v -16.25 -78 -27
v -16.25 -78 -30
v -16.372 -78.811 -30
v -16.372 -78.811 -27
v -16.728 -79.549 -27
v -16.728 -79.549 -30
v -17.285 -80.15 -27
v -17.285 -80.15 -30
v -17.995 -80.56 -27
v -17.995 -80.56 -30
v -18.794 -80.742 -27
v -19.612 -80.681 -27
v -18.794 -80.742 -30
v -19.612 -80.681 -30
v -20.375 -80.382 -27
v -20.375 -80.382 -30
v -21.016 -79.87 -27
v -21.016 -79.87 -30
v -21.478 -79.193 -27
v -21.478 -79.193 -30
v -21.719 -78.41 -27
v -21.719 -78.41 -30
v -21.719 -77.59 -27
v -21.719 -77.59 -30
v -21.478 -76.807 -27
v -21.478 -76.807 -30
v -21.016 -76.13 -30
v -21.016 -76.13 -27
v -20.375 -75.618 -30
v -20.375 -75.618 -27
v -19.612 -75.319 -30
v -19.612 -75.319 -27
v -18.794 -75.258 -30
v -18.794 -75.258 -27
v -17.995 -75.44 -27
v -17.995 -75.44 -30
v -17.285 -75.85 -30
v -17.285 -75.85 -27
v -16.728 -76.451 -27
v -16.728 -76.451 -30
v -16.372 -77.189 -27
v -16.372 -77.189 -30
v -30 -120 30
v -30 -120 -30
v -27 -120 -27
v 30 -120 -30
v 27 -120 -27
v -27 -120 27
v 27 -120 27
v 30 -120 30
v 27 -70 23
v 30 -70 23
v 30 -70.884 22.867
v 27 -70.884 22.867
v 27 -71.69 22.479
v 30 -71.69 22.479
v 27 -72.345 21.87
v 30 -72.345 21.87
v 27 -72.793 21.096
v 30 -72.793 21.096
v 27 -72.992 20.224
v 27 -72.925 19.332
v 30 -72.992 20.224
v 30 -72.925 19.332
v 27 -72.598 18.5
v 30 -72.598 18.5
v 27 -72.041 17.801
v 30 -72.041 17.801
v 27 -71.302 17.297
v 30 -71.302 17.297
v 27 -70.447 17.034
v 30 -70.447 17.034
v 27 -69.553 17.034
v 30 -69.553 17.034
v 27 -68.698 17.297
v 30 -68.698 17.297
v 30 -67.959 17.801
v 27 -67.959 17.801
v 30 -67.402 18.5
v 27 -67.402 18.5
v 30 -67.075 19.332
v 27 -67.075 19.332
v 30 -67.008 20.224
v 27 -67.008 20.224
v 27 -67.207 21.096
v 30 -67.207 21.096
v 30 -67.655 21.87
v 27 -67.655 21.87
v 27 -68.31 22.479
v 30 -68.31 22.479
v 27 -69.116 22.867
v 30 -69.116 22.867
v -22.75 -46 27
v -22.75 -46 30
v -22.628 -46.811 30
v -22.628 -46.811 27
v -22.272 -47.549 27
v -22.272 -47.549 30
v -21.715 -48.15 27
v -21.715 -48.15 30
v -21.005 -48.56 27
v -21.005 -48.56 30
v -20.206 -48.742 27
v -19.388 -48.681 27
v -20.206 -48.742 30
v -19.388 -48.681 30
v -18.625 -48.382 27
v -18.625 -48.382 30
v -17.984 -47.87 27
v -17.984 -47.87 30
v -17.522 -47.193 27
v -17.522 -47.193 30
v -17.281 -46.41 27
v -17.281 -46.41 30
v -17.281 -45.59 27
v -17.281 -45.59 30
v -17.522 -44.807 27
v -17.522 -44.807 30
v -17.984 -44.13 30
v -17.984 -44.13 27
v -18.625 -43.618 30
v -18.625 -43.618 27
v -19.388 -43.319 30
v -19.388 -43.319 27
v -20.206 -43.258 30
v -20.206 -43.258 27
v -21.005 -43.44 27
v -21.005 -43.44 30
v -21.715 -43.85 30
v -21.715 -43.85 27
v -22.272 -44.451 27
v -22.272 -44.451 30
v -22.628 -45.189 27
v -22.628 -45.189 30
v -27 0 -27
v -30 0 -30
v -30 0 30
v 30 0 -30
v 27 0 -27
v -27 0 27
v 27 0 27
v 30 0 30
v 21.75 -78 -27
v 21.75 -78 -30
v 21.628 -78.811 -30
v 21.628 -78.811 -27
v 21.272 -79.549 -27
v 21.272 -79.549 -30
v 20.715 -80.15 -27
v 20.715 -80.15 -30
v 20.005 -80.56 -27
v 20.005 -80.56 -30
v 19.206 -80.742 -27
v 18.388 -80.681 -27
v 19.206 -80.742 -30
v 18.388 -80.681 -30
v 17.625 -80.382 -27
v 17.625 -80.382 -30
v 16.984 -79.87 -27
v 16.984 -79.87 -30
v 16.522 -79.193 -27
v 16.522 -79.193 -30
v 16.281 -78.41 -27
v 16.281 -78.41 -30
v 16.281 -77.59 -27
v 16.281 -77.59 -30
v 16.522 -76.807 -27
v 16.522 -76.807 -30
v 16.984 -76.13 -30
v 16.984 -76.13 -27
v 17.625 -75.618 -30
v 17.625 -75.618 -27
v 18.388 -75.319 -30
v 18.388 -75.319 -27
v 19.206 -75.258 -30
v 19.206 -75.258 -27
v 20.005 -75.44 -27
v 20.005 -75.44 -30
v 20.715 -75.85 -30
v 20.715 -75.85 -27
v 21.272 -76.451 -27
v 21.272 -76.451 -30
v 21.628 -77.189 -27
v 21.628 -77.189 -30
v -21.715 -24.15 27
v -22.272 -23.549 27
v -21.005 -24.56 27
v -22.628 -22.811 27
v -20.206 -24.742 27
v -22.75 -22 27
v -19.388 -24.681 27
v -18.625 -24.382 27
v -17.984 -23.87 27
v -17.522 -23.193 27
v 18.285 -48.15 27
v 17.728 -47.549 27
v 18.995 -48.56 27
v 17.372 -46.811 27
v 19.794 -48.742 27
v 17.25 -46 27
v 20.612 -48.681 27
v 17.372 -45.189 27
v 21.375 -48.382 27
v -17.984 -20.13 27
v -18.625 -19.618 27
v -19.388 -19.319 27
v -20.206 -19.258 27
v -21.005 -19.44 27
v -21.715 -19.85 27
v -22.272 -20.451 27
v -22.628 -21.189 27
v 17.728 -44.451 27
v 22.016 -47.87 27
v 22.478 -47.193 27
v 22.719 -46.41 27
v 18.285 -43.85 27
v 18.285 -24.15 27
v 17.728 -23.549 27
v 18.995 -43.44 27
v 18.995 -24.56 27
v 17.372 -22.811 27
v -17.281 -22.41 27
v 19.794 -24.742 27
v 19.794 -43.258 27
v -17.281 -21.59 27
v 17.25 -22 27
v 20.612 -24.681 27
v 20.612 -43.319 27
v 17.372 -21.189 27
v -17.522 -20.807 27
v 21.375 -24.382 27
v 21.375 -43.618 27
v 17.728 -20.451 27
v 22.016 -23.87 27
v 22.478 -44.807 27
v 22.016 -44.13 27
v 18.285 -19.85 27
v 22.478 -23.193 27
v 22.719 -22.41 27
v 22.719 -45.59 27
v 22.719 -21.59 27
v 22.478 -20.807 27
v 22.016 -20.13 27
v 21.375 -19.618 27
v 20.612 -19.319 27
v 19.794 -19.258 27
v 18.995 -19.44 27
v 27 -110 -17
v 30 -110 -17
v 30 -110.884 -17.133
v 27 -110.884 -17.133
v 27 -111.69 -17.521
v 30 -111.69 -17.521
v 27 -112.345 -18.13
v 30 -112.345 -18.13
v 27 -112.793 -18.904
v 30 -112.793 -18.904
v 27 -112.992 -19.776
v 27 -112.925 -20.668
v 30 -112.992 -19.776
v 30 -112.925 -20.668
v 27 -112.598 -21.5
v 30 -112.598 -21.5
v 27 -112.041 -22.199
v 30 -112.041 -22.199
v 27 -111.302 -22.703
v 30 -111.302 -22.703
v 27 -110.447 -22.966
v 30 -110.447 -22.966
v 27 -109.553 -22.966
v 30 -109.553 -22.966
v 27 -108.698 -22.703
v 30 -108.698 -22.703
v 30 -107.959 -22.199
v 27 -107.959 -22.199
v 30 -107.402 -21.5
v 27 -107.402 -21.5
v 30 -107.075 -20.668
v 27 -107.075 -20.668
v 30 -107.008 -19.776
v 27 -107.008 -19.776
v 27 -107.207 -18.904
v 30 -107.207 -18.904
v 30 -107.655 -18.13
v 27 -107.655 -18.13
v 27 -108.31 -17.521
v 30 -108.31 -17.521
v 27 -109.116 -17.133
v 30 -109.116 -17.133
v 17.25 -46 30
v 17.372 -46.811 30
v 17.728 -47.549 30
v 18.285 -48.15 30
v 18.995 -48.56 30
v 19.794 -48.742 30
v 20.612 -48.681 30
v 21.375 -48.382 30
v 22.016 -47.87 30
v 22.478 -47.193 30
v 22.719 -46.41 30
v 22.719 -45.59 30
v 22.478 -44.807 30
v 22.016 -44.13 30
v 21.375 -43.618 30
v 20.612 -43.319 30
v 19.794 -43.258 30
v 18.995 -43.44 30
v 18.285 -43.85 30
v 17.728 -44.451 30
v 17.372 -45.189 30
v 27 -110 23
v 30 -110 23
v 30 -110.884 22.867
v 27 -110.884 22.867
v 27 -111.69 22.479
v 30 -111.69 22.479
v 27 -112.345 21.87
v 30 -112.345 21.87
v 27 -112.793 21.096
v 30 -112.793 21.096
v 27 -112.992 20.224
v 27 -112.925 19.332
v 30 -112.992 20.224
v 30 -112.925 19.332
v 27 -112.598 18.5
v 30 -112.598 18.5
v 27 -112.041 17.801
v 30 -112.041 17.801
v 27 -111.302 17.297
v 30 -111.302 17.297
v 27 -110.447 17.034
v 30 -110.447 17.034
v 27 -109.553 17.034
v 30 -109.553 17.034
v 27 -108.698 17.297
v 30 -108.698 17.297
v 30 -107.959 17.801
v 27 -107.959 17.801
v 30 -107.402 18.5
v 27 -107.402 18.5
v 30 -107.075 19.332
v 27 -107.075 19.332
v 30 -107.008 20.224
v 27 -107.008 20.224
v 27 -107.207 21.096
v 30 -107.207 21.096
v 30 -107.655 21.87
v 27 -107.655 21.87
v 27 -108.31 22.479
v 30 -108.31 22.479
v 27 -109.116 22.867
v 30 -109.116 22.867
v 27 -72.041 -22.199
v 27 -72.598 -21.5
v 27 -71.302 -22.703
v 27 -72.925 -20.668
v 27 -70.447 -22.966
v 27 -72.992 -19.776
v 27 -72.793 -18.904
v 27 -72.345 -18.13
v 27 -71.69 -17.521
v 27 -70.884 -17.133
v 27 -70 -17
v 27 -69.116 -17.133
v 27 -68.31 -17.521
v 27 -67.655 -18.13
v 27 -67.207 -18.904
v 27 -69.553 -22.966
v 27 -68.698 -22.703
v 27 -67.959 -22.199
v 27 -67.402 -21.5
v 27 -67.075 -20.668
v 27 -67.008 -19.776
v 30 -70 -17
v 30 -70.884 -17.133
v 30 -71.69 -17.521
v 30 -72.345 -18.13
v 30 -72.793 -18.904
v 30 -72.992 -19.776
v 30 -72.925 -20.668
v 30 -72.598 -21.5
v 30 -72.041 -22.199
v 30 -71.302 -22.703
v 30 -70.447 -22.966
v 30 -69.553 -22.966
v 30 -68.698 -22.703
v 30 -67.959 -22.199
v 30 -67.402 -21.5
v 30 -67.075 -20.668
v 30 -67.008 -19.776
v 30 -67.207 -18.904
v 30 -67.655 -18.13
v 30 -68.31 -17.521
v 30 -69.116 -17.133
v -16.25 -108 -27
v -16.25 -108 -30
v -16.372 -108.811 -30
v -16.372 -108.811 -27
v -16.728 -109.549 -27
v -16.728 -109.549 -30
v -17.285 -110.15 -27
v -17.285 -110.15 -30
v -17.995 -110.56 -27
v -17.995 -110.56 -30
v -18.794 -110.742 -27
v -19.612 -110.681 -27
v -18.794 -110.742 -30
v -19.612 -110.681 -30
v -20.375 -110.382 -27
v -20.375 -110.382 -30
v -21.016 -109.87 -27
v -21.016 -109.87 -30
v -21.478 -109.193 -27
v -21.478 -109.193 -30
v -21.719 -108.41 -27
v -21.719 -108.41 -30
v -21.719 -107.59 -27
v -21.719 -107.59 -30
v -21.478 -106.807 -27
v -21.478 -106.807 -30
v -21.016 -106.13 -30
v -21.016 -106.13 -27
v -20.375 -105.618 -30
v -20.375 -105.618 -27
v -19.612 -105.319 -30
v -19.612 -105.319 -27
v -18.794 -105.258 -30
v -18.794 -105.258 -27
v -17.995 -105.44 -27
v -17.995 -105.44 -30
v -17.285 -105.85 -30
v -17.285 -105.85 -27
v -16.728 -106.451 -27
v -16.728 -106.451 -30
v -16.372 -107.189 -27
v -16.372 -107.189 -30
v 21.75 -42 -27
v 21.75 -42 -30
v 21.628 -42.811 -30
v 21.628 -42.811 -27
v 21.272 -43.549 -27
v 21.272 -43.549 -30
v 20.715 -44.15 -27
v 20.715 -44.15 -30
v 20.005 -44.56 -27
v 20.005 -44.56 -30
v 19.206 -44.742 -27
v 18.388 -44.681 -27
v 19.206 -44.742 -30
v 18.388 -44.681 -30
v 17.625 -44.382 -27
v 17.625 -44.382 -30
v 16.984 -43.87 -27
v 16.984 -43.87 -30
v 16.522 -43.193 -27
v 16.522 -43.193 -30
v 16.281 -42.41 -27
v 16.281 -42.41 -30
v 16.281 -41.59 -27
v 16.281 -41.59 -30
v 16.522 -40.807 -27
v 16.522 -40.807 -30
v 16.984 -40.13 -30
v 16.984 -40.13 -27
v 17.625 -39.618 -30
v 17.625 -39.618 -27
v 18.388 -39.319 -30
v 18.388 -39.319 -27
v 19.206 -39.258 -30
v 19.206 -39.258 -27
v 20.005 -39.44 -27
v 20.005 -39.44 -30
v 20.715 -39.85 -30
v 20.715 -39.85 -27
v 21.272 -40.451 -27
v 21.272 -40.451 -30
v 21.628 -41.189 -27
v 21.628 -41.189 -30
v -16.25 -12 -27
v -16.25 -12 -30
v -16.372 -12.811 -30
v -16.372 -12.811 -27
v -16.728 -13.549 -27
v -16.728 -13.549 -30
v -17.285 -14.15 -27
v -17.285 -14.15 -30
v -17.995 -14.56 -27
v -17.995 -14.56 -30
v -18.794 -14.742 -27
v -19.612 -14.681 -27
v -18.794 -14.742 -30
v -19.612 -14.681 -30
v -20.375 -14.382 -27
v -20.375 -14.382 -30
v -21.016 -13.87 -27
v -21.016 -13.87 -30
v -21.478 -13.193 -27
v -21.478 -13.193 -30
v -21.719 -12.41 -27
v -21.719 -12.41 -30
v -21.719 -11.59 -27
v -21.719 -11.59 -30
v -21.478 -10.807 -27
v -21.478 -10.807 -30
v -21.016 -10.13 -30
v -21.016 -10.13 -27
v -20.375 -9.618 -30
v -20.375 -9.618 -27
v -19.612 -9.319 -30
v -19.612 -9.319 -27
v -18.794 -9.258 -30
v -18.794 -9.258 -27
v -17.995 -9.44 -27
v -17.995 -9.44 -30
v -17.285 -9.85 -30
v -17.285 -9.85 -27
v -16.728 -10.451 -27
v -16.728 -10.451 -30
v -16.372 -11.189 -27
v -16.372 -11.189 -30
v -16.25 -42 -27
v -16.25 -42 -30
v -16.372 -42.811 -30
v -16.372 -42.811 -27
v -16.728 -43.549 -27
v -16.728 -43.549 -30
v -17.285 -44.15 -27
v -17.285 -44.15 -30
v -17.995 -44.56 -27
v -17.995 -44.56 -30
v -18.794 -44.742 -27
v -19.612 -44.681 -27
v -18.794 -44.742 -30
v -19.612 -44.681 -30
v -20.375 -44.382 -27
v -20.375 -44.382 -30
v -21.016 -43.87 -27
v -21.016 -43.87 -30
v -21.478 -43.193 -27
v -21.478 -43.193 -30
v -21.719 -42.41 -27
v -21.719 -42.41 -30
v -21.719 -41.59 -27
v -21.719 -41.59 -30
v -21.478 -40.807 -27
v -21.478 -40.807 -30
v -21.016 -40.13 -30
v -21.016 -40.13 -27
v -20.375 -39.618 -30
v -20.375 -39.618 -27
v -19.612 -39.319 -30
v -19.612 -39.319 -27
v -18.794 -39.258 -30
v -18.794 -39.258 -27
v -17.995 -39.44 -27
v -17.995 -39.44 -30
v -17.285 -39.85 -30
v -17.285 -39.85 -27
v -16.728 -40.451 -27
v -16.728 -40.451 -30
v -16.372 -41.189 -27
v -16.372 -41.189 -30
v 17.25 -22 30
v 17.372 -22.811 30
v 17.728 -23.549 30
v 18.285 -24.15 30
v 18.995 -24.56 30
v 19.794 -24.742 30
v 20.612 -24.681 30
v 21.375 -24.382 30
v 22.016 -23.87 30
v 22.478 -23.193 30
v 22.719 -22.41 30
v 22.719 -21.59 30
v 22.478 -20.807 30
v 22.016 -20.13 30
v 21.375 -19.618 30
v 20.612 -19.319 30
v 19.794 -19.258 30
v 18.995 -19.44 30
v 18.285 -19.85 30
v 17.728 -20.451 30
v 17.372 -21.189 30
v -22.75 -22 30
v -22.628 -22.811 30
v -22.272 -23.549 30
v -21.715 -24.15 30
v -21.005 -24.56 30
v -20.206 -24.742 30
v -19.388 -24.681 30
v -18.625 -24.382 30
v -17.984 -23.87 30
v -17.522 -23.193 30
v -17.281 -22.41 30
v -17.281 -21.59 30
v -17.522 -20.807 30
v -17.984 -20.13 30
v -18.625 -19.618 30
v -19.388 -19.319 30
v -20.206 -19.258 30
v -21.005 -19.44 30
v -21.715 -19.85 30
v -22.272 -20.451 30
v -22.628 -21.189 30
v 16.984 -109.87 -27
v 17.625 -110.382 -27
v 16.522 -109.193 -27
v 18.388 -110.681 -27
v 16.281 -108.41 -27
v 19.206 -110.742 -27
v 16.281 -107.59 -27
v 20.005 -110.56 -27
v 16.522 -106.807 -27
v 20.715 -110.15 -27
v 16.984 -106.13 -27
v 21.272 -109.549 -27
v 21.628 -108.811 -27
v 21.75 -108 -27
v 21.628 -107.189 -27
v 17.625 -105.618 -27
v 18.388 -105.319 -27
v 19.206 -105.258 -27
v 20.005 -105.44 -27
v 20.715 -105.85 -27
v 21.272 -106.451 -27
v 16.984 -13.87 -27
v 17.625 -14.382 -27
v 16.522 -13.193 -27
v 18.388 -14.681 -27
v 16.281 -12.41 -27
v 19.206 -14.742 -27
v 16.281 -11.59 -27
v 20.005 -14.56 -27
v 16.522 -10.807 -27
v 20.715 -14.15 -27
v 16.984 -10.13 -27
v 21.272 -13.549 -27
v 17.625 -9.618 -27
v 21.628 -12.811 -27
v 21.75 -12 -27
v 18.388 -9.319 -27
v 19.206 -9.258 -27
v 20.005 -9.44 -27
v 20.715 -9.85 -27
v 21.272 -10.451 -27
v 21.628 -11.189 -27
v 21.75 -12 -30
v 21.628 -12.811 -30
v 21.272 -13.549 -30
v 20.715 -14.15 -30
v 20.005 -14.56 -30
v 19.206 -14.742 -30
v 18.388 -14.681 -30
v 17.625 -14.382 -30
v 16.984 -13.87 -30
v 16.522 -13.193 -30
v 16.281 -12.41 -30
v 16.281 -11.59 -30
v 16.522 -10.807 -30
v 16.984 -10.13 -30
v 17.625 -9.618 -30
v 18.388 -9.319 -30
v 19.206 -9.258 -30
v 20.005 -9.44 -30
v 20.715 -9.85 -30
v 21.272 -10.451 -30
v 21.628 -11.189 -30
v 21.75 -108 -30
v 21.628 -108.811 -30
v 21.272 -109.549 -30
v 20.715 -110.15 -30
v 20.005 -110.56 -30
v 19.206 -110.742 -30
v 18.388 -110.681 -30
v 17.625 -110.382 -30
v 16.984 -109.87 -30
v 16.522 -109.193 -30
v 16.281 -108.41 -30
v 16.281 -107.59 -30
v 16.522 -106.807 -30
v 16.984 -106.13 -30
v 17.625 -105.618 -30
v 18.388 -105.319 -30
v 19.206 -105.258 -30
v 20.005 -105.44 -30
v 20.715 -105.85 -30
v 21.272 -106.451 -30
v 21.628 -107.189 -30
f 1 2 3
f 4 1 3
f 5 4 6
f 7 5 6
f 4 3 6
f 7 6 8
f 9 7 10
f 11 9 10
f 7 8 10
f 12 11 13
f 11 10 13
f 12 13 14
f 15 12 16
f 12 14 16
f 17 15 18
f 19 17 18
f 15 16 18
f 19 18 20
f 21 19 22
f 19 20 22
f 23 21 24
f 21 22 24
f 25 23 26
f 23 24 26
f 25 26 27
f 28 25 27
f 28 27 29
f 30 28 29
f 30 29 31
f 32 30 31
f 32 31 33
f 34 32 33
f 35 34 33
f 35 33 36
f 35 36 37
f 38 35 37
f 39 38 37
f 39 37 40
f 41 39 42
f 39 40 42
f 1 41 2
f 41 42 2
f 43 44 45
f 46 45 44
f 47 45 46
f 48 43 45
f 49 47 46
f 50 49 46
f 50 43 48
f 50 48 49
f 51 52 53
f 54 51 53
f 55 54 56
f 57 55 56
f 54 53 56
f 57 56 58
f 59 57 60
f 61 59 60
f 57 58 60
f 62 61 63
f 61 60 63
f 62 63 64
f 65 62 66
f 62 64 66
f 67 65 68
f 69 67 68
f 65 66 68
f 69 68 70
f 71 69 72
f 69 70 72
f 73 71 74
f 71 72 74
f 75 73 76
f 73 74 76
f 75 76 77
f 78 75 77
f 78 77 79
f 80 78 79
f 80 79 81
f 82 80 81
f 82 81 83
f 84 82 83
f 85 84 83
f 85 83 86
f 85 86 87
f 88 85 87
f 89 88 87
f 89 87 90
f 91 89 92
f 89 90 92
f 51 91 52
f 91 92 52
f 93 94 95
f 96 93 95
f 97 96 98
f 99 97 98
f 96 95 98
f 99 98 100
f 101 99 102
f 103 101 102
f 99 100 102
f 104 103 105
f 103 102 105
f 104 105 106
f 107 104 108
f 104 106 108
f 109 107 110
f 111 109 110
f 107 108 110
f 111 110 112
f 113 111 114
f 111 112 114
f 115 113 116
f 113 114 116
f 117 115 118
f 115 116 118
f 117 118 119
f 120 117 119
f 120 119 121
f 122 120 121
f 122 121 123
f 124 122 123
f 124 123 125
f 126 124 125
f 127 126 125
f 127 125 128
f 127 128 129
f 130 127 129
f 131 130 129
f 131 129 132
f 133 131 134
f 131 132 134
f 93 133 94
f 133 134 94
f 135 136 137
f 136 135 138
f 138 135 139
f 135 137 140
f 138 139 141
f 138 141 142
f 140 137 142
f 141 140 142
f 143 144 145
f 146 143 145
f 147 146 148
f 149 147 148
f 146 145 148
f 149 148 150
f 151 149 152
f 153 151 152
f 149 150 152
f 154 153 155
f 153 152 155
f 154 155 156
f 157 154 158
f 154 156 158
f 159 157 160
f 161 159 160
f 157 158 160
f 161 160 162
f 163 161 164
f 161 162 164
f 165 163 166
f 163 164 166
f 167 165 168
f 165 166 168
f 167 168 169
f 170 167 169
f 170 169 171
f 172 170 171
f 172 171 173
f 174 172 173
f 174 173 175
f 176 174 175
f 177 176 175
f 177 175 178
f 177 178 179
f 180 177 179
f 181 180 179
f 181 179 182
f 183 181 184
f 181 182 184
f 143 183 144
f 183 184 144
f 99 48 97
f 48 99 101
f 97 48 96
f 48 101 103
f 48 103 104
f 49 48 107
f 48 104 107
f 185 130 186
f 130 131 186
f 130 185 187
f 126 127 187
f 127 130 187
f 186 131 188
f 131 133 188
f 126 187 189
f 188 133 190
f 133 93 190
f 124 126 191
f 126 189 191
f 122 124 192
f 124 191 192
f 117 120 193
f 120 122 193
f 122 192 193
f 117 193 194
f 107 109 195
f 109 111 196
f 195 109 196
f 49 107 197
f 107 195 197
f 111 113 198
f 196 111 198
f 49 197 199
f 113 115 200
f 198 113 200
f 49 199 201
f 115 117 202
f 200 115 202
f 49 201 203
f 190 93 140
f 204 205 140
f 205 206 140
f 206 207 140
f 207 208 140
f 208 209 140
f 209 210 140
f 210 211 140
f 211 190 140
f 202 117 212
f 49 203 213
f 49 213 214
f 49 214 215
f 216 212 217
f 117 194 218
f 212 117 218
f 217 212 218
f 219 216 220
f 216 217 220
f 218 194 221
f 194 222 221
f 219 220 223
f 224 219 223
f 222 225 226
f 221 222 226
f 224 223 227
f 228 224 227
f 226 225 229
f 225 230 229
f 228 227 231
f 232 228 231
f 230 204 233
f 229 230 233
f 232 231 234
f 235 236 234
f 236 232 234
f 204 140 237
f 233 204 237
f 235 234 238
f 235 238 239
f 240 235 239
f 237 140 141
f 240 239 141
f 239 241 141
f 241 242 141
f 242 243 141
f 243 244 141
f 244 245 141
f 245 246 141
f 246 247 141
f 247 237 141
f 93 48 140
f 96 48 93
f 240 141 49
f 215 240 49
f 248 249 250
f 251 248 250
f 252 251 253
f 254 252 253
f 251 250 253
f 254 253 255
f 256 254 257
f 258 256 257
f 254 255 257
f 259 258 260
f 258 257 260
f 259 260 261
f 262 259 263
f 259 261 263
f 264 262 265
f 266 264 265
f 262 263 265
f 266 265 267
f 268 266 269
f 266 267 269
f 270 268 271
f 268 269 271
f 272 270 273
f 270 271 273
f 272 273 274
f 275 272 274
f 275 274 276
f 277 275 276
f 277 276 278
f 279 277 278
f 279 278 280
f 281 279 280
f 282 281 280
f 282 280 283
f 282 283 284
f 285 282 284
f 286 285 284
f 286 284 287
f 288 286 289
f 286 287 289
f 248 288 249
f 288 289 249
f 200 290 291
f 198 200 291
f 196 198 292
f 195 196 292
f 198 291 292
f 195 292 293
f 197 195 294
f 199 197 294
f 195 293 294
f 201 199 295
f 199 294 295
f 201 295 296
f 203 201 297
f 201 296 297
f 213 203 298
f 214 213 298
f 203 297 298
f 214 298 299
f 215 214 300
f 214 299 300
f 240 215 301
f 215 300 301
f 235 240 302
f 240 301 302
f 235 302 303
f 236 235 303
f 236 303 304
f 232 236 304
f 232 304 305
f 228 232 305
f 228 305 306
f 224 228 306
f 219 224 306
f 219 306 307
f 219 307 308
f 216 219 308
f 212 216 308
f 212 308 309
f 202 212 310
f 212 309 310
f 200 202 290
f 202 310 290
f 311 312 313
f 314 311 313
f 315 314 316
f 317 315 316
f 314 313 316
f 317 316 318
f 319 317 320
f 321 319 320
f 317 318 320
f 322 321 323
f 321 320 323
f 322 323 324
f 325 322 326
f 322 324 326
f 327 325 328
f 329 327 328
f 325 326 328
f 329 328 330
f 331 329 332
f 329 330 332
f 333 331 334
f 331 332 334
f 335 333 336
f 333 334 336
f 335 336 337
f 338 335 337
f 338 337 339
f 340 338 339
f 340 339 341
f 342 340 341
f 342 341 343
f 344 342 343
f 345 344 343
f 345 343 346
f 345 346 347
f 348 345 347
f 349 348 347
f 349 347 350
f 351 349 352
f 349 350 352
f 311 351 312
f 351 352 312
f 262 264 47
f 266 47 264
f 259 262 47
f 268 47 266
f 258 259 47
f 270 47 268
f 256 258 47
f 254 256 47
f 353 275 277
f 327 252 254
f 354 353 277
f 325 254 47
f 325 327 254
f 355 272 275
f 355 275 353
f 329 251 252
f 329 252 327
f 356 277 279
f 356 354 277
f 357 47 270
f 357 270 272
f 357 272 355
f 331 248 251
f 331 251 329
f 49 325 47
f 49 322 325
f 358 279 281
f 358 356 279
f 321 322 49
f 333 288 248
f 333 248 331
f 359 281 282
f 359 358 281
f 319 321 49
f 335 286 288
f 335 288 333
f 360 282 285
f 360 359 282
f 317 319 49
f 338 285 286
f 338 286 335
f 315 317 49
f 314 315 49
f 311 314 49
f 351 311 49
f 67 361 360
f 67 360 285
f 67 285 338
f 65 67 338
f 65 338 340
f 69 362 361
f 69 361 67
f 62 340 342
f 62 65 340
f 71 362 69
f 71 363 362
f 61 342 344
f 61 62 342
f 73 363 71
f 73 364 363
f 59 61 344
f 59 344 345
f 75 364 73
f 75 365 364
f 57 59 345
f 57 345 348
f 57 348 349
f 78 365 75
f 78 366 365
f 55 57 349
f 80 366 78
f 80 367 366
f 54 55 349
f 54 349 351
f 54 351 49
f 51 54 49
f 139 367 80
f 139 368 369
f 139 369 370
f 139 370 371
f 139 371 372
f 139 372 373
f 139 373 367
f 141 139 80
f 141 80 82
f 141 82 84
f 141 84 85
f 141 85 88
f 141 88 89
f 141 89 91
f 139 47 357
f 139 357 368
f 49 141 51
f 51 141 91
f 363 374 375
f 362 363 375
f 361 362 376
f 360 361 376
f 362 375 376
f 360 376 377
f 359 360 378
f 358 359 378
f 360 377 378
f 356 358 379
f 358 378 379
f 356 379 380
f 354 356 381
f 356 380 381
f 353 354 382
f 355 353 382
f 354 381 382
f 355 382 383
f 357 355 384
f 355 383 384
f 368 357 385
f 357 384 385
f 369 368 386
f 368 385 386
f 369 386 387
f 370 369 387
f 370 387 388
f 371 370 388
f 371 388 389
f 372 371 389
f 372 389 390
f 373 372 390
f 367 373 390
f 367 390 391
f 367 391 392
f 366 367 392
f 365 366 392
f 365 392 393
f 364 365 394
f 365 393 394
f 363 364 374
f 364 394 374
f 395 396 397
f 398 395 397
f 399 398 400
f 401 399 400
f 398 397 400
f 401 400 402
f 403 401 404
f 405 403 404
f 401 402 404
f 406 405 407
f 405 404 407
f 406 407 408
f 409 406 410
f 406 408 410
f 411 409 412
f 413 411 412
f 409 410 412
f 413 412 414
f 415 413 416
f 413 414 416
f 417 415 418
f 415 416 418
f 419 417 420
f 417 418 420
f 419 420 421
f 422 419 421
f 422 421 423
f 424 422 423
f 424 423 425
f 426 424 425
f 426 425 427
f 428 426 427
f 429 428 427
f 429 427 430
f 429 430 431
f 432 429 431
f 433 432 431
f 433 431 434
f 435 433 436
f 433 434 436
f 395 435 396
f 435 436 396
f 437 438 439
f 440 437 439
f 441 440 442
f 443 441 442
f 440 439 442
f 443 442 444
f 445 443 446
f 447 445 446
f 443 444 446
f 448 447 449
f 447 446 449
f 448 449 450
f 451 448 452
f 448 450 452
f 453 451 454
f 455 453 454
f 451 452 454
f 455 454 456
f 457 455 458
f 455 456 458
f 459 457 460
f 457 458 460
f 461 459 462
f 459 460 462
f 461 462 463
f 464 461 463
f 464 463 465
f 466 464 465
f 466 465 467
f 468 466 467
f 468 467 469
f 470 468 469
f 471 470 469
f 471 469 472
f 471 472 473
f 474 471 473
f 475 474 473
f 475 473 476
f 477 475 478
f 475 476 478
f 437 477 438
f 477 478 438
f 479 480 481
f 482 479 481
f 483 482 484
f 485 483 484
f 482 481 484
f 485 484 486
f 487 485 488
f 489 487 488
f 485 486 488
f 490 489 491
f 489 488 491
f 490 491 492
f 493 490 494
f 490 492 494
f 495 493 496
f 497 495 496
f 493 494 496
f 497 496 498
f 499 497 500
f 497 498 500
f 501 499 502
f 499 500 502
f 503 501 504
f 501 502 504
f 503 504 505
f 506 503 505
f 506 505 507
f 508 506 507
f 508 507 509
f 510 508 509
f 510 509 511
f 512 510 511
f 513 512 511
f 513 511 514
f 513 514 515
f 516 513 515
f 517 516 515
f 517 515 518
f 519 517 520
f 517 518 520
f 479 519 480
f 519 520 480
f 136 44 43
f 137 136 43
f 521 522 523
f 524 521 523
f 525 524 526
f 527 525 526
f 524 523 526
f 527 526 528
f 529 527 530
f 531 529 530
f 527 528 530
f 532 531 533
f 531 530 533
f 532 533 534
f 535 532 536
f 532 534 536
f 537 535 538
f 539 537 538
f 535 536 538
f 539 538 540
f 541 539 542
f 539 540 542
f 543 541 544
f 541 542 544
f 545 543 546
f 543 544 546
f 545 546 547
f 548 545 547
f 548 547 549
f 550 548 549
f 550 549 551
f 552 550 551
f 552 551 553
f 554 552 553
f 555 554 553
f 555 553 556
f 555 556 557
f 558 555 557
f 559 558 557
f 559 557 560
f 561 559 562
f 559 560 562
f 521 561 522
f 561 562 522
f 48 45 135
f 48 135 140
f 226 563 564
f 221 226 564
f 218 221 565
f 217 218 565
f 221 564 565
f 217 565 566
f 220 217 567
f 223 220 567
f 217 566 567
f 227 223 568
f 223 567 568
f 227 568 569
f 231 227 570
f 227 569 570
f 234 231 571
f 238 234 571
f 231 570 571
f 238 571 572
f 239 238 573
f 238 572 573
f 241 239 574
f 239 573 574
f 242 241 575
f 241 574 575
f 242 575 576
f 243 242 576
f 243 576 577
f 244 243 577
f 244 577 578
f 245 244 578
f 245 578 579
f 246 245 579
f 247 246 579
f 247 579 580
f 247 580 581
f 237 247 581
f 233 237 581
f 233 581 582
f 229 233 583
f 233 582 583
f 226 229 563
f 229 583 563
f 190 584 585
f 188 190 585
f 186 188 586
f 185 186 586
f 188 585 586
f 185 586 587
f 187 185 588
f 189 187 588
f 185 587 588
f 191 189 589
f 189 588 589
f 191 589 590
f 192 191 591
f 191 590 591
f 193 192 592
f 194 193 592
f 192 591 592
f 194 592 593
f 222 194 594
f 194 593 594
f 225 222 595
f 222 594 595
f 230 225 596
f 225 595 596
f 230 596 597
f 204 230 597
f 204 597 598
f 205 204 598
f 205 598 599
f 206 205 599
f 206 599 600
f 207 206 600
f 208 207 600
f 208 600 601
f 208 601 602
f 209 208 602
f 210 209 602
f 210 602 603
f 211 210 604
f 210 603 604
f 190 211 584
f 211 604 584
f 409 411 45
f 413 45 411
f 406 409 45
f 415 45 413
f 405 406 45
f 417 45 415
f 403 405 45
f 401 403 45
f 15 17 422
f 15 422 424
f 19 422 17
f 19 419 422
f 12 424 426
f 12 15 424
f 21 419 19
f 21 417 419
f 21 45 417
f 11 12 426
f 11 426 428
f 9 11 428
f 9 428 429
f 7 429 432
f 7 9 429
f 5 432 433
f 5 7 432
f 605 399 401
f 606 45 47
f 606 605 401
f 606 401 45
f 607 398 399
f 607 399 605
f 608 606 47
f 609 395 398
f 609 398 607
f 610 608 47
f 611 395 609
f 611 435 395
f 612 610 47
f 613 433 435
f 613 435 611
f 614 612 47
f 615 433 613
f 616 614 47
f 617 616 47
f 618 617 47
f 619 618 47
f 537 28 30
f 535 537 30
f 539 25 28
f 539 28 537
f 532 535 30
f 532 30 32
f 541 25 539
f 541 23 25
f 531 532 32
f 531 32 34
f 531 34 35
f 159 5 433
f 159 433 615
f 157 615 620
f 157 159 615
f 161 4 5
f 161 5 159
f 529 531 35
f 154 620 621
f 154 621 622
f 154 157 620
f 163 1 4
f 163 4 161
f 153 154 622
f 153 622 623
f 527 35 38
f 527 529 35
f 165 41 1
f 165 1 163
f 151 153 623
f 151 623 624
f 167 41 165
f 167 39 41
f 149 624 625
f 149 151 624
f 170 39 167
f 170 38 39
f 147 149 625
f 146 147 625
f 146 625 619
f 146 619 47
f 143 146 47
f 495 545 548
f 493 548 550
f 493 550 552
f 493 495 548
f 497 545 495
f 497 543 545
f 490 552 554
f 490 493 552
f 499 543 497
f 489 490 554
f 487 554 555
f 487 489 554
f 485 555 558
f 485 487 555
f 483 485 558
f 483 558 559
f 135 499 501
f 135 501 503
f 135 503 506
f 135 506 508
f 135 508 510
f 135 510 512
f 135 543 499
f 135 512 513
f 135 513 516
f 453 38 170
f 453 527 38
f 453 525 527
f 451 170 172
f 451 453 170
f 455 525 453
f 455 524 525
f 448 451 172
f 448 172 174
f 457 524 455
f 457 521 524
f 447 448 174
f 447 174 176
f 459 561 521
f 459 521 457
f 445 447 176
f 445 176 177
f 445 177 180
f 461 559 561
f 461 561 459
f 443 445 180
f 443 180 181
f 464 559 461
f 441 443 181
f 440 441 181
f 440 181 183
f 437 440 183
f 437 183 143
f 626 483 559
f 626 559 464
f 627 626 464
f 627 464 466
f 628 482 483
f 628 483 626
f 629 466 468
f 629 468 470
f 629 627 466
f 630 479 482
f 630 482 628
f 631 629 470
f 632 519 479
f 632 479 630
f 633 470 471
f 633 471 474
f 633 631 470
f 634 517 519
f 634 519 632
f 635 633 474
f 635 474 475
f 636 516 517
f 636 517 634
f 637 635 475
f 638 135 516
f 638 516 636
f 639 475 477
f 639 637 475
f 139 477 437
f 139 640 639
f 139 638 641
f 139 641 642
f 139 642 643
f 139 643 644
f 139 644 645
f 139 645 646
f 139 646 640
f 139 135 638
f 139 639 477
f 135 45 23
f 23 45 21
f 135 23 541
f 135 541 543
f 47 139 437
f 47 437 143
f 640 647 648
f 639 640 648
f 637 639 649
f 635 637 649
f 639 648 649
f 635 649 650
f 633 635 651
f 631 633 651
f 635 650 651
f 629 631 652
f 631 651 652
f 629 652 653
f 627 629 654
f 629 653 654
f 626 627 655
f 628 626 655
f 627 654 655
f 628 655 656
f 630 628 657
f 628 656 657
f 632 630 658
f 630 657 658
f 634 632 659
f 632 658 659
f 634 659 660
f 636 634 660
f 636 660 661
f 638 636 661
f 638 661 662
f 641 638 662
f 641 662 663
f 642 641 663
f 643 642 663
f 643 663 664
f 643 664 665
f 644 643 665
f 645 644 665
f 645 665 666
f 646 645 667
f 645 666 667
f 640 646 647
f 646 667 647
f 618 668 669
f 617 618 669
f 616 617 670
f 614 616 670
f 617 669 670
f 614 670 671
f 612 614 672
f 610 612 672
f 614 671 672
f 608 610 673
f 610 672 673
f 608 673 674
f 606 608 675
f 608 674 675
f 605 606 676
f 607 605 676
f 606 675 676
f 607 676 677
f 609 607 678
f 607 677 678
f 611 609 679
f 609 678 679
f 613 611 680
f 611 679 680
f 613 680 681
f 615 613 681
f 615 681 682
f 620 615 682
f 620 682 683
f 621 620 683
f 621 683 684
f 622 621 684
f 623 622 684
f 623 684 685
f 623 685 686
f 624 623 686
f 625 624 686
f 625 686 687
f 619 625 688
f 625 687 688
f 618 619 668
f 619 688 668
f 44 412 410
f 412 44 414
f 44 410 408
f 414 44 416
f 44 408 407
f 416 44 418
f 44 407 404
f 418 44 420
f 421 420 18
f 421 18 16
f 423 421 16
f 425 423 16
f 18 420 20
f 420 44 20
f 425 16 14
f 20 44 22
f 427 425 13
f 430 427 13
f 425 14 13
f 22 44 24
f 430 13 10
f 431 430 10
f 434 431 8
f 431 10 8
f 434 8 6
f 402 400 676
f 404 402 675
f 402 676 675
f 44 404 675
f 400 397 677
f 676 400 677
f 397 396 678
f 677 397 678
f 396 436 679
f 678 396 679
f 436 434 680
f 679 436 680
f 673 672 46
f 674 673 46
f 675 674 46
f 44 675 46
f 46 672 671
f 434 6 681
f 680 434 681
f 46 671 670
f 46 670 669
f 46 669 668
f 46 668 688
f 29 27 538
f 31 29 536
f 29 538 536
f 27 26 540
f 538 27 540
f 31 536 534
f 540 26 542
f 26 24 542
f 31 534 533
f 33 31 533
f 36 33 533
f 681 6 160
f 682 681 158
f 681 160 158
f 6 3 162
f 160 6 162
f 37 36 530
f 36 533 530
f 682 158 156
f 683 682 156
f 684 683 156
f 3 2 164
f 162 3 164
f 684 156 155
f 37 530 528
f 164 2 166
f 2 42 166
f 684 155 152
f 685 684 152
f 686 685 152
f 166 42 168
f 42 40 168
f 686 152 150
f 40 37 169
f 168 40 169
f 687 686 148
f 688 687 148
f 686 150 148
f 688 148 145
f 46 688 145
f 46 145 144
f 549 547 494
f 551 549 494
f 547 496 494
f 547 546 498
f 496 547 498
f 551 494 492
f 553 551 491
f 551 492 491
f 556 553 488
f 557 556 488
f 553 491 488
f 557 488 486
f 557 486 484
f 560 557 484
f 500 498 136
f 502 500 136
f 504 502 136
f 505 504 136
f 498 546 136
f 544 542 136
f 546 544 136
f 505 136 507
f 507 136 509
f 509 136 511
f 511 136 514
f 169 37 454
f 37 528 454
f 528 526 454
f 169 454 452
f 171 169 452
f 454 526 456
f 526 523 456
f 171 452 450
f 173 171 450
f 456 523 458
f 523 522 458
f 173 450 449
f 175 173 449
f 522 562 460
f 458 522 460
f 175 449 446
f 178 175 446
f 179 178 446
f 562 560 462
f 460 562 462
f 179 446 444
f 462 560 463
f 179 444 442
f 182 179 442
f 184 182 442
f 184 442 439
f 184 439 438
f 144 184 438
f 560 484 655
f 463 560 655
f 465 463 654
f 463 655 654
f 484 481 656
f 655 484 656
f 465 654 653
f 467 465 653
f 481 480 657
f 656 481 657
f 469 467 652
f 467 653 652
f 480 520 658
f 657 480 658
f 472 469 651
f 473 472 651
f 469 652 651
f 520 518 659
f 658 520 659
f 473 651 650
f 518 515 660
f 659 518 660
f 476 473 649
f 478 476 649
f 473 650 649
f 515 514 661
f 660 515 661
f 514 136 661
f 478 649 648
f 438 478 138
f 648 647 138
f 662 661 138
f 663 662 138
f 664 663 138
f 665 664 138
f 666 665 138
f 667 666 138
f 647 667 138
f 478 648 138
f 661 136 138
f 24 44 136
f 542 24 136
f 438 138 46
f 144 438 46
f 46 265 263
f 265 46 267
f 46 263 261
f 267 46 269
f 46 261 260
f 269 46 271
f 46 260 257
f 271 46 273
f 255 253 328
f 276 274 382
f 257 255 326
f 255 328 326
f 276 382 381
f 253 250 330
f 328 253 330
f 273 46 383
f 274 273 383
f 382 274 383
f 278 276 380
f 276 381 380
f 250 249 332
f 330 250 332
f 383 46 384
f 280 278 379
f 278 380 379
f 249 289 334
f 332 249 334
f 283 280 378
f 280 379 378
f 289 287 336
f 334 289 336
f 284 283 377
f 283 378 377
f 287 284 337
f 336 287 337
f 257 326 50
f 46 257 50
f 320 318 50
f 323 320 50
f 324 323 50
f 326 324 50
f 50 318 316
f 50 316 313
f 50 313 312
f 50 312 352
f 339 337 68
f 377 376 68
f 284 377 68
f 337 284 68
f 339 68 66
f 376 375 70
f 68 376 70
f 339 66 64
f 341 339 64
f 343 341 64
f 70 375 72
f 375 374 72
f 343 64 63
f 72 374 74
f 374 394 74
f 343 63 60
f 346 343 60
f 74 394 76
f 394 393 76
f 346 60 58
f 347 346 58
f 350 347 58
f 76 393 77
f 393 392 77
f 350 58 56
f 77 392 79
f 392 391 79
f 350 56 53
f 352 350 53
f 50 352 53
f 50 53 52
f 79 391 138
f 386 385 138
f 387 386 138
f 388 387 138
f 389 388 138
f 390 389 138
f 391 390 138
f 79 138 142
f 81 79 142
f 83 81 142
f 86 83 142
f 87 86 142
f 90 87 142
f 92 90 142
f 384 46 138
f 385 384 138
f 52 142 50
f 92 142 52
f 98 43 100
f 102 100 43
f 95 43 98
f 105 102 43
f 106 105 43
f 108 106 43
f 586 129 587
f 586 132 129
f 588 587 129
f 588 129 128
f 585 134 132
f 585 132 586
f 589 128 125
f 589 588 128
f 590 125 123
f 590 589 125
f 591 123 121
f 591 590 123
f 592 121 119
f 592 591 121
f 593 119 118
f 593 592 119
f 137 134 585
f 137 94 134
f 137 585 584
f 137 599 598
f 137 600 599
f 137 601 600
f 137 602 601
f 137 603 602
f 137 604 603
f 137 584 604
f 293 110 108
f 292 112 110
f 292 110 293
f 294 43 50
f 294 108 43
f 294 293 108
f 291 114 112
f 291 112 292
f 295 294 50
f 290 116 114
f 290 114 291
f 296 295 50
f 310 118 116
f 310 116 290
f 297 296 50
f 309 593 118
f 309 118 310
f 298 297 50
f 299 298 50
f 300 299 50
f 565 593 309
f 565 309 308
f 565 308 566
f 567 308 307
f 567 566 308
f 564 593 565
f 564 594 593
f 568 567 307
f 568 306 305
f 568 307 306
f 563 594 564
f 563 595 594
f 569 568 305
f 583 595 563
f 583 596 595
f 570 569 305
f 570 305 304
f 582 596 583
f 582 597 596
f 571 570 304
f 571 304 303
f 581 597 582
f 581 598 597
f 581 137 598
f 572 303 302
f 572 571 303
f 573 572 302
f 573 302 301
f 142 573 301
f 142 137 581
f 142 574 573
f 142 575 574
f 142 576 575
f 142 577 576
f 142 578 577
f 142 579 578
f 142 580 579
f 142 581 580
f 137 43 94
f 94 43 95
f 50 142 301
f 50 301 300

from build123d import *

# Parameters (mm, degrees)
SKETCH_W        = 60
SKETCH_H        = 60
SKETCH_W_2      = 54
SKETCH_H_2      = 54
PAD_DEPTH       = 120
SKETCH001_R     = 2.75
POCKET_DEPTH    = 3
SKETCH002_R     = 2.75
POCKET001_DEPTH = 3
SKETCH003_R     = 3
POCKET002_DEPTH = 3


with BuildPart() as part:
    # Sketch → Pad (new body)
    with BuildSketch(Plane.XZ):
        Rectangle(SKETCH_W, SKETCH_H)
        Rectangle(SKETCH_W_2, SKETCH_H_2, mode=Mode.SUBTRACT)
    extrude(amount=PAD_DEPTH)

    # Sketch001 (on Face3 of Pad) → Pocket (cut)
    with BuildSketch(Plane(origin=(0, 0, -30), x_dir=(1, 0, 0), z_dir=(0, 0, -1))):
        with Locations((-19, 108)):
            Circle(SKETCH001_R)
        with Locations((-19, 78)):
            Circle(SKETCH001_R)
        with Locations((19, 108)):
            Circle(SKETCH001_R)
        with Locations((19, 78)):
            Circle(SKETCH001_R)
        with Locations((-19, 42)):
            Circle(SKETCH001_R)
        with Locations((-19, 12)):
            Circle(SKETCH001_R)
        with Locations((19, 42)):
            Circle(SKETCH001_R)
        with Locations((19, 12)):
            Circle(SKETCH001_R)
    extrude(amount=-POCKET_DEPTH, mode=Mode.SUBTRACT)

    # Sketch002 (on Face1 of Pocket) → Pocket001 (cut)
    with BuildSketch(Plane(origin=(0, 0, 30), x_dir=(-1, 0, 0), z_dir=(0, 0, 1))):
        with Locations((-20, 46)):
            Circle(SKETCH002_R)
        with Locations((-20, 22)):
            Circle(SKETCH002_R)
        with Locations((20, 46)):
            Circle(SKETCH002_R)
        with Locations((20, 22)):
            Circle(SKETCH002_R)
    extrude(amount=-POCKET001_DEPTH, mode=Mode.SUBTRACT)

    # Sketch003 (on Face5 of Pocket001) → Pocket002 (cut)
    with BuildSketch(Plane(origin=(30, 0, 0), x_dir=(0, 0, 1), z_dir=(1, 0, 0))):
        with Locations((-20, 110)):
            Circle(SKETCH003_R)
        with Locations((20, 110)):
            Circle(SKETCH003_R)
        with Locations((-20, 70)):
            Circle(SKETCH003_R)
        with Locations((20, 70)):
            Circle(SKETCH003_R)
    extrude(amount=-POCKET002_DEPTH, mode=Mode.SUBTRACT)


solid = part.part
